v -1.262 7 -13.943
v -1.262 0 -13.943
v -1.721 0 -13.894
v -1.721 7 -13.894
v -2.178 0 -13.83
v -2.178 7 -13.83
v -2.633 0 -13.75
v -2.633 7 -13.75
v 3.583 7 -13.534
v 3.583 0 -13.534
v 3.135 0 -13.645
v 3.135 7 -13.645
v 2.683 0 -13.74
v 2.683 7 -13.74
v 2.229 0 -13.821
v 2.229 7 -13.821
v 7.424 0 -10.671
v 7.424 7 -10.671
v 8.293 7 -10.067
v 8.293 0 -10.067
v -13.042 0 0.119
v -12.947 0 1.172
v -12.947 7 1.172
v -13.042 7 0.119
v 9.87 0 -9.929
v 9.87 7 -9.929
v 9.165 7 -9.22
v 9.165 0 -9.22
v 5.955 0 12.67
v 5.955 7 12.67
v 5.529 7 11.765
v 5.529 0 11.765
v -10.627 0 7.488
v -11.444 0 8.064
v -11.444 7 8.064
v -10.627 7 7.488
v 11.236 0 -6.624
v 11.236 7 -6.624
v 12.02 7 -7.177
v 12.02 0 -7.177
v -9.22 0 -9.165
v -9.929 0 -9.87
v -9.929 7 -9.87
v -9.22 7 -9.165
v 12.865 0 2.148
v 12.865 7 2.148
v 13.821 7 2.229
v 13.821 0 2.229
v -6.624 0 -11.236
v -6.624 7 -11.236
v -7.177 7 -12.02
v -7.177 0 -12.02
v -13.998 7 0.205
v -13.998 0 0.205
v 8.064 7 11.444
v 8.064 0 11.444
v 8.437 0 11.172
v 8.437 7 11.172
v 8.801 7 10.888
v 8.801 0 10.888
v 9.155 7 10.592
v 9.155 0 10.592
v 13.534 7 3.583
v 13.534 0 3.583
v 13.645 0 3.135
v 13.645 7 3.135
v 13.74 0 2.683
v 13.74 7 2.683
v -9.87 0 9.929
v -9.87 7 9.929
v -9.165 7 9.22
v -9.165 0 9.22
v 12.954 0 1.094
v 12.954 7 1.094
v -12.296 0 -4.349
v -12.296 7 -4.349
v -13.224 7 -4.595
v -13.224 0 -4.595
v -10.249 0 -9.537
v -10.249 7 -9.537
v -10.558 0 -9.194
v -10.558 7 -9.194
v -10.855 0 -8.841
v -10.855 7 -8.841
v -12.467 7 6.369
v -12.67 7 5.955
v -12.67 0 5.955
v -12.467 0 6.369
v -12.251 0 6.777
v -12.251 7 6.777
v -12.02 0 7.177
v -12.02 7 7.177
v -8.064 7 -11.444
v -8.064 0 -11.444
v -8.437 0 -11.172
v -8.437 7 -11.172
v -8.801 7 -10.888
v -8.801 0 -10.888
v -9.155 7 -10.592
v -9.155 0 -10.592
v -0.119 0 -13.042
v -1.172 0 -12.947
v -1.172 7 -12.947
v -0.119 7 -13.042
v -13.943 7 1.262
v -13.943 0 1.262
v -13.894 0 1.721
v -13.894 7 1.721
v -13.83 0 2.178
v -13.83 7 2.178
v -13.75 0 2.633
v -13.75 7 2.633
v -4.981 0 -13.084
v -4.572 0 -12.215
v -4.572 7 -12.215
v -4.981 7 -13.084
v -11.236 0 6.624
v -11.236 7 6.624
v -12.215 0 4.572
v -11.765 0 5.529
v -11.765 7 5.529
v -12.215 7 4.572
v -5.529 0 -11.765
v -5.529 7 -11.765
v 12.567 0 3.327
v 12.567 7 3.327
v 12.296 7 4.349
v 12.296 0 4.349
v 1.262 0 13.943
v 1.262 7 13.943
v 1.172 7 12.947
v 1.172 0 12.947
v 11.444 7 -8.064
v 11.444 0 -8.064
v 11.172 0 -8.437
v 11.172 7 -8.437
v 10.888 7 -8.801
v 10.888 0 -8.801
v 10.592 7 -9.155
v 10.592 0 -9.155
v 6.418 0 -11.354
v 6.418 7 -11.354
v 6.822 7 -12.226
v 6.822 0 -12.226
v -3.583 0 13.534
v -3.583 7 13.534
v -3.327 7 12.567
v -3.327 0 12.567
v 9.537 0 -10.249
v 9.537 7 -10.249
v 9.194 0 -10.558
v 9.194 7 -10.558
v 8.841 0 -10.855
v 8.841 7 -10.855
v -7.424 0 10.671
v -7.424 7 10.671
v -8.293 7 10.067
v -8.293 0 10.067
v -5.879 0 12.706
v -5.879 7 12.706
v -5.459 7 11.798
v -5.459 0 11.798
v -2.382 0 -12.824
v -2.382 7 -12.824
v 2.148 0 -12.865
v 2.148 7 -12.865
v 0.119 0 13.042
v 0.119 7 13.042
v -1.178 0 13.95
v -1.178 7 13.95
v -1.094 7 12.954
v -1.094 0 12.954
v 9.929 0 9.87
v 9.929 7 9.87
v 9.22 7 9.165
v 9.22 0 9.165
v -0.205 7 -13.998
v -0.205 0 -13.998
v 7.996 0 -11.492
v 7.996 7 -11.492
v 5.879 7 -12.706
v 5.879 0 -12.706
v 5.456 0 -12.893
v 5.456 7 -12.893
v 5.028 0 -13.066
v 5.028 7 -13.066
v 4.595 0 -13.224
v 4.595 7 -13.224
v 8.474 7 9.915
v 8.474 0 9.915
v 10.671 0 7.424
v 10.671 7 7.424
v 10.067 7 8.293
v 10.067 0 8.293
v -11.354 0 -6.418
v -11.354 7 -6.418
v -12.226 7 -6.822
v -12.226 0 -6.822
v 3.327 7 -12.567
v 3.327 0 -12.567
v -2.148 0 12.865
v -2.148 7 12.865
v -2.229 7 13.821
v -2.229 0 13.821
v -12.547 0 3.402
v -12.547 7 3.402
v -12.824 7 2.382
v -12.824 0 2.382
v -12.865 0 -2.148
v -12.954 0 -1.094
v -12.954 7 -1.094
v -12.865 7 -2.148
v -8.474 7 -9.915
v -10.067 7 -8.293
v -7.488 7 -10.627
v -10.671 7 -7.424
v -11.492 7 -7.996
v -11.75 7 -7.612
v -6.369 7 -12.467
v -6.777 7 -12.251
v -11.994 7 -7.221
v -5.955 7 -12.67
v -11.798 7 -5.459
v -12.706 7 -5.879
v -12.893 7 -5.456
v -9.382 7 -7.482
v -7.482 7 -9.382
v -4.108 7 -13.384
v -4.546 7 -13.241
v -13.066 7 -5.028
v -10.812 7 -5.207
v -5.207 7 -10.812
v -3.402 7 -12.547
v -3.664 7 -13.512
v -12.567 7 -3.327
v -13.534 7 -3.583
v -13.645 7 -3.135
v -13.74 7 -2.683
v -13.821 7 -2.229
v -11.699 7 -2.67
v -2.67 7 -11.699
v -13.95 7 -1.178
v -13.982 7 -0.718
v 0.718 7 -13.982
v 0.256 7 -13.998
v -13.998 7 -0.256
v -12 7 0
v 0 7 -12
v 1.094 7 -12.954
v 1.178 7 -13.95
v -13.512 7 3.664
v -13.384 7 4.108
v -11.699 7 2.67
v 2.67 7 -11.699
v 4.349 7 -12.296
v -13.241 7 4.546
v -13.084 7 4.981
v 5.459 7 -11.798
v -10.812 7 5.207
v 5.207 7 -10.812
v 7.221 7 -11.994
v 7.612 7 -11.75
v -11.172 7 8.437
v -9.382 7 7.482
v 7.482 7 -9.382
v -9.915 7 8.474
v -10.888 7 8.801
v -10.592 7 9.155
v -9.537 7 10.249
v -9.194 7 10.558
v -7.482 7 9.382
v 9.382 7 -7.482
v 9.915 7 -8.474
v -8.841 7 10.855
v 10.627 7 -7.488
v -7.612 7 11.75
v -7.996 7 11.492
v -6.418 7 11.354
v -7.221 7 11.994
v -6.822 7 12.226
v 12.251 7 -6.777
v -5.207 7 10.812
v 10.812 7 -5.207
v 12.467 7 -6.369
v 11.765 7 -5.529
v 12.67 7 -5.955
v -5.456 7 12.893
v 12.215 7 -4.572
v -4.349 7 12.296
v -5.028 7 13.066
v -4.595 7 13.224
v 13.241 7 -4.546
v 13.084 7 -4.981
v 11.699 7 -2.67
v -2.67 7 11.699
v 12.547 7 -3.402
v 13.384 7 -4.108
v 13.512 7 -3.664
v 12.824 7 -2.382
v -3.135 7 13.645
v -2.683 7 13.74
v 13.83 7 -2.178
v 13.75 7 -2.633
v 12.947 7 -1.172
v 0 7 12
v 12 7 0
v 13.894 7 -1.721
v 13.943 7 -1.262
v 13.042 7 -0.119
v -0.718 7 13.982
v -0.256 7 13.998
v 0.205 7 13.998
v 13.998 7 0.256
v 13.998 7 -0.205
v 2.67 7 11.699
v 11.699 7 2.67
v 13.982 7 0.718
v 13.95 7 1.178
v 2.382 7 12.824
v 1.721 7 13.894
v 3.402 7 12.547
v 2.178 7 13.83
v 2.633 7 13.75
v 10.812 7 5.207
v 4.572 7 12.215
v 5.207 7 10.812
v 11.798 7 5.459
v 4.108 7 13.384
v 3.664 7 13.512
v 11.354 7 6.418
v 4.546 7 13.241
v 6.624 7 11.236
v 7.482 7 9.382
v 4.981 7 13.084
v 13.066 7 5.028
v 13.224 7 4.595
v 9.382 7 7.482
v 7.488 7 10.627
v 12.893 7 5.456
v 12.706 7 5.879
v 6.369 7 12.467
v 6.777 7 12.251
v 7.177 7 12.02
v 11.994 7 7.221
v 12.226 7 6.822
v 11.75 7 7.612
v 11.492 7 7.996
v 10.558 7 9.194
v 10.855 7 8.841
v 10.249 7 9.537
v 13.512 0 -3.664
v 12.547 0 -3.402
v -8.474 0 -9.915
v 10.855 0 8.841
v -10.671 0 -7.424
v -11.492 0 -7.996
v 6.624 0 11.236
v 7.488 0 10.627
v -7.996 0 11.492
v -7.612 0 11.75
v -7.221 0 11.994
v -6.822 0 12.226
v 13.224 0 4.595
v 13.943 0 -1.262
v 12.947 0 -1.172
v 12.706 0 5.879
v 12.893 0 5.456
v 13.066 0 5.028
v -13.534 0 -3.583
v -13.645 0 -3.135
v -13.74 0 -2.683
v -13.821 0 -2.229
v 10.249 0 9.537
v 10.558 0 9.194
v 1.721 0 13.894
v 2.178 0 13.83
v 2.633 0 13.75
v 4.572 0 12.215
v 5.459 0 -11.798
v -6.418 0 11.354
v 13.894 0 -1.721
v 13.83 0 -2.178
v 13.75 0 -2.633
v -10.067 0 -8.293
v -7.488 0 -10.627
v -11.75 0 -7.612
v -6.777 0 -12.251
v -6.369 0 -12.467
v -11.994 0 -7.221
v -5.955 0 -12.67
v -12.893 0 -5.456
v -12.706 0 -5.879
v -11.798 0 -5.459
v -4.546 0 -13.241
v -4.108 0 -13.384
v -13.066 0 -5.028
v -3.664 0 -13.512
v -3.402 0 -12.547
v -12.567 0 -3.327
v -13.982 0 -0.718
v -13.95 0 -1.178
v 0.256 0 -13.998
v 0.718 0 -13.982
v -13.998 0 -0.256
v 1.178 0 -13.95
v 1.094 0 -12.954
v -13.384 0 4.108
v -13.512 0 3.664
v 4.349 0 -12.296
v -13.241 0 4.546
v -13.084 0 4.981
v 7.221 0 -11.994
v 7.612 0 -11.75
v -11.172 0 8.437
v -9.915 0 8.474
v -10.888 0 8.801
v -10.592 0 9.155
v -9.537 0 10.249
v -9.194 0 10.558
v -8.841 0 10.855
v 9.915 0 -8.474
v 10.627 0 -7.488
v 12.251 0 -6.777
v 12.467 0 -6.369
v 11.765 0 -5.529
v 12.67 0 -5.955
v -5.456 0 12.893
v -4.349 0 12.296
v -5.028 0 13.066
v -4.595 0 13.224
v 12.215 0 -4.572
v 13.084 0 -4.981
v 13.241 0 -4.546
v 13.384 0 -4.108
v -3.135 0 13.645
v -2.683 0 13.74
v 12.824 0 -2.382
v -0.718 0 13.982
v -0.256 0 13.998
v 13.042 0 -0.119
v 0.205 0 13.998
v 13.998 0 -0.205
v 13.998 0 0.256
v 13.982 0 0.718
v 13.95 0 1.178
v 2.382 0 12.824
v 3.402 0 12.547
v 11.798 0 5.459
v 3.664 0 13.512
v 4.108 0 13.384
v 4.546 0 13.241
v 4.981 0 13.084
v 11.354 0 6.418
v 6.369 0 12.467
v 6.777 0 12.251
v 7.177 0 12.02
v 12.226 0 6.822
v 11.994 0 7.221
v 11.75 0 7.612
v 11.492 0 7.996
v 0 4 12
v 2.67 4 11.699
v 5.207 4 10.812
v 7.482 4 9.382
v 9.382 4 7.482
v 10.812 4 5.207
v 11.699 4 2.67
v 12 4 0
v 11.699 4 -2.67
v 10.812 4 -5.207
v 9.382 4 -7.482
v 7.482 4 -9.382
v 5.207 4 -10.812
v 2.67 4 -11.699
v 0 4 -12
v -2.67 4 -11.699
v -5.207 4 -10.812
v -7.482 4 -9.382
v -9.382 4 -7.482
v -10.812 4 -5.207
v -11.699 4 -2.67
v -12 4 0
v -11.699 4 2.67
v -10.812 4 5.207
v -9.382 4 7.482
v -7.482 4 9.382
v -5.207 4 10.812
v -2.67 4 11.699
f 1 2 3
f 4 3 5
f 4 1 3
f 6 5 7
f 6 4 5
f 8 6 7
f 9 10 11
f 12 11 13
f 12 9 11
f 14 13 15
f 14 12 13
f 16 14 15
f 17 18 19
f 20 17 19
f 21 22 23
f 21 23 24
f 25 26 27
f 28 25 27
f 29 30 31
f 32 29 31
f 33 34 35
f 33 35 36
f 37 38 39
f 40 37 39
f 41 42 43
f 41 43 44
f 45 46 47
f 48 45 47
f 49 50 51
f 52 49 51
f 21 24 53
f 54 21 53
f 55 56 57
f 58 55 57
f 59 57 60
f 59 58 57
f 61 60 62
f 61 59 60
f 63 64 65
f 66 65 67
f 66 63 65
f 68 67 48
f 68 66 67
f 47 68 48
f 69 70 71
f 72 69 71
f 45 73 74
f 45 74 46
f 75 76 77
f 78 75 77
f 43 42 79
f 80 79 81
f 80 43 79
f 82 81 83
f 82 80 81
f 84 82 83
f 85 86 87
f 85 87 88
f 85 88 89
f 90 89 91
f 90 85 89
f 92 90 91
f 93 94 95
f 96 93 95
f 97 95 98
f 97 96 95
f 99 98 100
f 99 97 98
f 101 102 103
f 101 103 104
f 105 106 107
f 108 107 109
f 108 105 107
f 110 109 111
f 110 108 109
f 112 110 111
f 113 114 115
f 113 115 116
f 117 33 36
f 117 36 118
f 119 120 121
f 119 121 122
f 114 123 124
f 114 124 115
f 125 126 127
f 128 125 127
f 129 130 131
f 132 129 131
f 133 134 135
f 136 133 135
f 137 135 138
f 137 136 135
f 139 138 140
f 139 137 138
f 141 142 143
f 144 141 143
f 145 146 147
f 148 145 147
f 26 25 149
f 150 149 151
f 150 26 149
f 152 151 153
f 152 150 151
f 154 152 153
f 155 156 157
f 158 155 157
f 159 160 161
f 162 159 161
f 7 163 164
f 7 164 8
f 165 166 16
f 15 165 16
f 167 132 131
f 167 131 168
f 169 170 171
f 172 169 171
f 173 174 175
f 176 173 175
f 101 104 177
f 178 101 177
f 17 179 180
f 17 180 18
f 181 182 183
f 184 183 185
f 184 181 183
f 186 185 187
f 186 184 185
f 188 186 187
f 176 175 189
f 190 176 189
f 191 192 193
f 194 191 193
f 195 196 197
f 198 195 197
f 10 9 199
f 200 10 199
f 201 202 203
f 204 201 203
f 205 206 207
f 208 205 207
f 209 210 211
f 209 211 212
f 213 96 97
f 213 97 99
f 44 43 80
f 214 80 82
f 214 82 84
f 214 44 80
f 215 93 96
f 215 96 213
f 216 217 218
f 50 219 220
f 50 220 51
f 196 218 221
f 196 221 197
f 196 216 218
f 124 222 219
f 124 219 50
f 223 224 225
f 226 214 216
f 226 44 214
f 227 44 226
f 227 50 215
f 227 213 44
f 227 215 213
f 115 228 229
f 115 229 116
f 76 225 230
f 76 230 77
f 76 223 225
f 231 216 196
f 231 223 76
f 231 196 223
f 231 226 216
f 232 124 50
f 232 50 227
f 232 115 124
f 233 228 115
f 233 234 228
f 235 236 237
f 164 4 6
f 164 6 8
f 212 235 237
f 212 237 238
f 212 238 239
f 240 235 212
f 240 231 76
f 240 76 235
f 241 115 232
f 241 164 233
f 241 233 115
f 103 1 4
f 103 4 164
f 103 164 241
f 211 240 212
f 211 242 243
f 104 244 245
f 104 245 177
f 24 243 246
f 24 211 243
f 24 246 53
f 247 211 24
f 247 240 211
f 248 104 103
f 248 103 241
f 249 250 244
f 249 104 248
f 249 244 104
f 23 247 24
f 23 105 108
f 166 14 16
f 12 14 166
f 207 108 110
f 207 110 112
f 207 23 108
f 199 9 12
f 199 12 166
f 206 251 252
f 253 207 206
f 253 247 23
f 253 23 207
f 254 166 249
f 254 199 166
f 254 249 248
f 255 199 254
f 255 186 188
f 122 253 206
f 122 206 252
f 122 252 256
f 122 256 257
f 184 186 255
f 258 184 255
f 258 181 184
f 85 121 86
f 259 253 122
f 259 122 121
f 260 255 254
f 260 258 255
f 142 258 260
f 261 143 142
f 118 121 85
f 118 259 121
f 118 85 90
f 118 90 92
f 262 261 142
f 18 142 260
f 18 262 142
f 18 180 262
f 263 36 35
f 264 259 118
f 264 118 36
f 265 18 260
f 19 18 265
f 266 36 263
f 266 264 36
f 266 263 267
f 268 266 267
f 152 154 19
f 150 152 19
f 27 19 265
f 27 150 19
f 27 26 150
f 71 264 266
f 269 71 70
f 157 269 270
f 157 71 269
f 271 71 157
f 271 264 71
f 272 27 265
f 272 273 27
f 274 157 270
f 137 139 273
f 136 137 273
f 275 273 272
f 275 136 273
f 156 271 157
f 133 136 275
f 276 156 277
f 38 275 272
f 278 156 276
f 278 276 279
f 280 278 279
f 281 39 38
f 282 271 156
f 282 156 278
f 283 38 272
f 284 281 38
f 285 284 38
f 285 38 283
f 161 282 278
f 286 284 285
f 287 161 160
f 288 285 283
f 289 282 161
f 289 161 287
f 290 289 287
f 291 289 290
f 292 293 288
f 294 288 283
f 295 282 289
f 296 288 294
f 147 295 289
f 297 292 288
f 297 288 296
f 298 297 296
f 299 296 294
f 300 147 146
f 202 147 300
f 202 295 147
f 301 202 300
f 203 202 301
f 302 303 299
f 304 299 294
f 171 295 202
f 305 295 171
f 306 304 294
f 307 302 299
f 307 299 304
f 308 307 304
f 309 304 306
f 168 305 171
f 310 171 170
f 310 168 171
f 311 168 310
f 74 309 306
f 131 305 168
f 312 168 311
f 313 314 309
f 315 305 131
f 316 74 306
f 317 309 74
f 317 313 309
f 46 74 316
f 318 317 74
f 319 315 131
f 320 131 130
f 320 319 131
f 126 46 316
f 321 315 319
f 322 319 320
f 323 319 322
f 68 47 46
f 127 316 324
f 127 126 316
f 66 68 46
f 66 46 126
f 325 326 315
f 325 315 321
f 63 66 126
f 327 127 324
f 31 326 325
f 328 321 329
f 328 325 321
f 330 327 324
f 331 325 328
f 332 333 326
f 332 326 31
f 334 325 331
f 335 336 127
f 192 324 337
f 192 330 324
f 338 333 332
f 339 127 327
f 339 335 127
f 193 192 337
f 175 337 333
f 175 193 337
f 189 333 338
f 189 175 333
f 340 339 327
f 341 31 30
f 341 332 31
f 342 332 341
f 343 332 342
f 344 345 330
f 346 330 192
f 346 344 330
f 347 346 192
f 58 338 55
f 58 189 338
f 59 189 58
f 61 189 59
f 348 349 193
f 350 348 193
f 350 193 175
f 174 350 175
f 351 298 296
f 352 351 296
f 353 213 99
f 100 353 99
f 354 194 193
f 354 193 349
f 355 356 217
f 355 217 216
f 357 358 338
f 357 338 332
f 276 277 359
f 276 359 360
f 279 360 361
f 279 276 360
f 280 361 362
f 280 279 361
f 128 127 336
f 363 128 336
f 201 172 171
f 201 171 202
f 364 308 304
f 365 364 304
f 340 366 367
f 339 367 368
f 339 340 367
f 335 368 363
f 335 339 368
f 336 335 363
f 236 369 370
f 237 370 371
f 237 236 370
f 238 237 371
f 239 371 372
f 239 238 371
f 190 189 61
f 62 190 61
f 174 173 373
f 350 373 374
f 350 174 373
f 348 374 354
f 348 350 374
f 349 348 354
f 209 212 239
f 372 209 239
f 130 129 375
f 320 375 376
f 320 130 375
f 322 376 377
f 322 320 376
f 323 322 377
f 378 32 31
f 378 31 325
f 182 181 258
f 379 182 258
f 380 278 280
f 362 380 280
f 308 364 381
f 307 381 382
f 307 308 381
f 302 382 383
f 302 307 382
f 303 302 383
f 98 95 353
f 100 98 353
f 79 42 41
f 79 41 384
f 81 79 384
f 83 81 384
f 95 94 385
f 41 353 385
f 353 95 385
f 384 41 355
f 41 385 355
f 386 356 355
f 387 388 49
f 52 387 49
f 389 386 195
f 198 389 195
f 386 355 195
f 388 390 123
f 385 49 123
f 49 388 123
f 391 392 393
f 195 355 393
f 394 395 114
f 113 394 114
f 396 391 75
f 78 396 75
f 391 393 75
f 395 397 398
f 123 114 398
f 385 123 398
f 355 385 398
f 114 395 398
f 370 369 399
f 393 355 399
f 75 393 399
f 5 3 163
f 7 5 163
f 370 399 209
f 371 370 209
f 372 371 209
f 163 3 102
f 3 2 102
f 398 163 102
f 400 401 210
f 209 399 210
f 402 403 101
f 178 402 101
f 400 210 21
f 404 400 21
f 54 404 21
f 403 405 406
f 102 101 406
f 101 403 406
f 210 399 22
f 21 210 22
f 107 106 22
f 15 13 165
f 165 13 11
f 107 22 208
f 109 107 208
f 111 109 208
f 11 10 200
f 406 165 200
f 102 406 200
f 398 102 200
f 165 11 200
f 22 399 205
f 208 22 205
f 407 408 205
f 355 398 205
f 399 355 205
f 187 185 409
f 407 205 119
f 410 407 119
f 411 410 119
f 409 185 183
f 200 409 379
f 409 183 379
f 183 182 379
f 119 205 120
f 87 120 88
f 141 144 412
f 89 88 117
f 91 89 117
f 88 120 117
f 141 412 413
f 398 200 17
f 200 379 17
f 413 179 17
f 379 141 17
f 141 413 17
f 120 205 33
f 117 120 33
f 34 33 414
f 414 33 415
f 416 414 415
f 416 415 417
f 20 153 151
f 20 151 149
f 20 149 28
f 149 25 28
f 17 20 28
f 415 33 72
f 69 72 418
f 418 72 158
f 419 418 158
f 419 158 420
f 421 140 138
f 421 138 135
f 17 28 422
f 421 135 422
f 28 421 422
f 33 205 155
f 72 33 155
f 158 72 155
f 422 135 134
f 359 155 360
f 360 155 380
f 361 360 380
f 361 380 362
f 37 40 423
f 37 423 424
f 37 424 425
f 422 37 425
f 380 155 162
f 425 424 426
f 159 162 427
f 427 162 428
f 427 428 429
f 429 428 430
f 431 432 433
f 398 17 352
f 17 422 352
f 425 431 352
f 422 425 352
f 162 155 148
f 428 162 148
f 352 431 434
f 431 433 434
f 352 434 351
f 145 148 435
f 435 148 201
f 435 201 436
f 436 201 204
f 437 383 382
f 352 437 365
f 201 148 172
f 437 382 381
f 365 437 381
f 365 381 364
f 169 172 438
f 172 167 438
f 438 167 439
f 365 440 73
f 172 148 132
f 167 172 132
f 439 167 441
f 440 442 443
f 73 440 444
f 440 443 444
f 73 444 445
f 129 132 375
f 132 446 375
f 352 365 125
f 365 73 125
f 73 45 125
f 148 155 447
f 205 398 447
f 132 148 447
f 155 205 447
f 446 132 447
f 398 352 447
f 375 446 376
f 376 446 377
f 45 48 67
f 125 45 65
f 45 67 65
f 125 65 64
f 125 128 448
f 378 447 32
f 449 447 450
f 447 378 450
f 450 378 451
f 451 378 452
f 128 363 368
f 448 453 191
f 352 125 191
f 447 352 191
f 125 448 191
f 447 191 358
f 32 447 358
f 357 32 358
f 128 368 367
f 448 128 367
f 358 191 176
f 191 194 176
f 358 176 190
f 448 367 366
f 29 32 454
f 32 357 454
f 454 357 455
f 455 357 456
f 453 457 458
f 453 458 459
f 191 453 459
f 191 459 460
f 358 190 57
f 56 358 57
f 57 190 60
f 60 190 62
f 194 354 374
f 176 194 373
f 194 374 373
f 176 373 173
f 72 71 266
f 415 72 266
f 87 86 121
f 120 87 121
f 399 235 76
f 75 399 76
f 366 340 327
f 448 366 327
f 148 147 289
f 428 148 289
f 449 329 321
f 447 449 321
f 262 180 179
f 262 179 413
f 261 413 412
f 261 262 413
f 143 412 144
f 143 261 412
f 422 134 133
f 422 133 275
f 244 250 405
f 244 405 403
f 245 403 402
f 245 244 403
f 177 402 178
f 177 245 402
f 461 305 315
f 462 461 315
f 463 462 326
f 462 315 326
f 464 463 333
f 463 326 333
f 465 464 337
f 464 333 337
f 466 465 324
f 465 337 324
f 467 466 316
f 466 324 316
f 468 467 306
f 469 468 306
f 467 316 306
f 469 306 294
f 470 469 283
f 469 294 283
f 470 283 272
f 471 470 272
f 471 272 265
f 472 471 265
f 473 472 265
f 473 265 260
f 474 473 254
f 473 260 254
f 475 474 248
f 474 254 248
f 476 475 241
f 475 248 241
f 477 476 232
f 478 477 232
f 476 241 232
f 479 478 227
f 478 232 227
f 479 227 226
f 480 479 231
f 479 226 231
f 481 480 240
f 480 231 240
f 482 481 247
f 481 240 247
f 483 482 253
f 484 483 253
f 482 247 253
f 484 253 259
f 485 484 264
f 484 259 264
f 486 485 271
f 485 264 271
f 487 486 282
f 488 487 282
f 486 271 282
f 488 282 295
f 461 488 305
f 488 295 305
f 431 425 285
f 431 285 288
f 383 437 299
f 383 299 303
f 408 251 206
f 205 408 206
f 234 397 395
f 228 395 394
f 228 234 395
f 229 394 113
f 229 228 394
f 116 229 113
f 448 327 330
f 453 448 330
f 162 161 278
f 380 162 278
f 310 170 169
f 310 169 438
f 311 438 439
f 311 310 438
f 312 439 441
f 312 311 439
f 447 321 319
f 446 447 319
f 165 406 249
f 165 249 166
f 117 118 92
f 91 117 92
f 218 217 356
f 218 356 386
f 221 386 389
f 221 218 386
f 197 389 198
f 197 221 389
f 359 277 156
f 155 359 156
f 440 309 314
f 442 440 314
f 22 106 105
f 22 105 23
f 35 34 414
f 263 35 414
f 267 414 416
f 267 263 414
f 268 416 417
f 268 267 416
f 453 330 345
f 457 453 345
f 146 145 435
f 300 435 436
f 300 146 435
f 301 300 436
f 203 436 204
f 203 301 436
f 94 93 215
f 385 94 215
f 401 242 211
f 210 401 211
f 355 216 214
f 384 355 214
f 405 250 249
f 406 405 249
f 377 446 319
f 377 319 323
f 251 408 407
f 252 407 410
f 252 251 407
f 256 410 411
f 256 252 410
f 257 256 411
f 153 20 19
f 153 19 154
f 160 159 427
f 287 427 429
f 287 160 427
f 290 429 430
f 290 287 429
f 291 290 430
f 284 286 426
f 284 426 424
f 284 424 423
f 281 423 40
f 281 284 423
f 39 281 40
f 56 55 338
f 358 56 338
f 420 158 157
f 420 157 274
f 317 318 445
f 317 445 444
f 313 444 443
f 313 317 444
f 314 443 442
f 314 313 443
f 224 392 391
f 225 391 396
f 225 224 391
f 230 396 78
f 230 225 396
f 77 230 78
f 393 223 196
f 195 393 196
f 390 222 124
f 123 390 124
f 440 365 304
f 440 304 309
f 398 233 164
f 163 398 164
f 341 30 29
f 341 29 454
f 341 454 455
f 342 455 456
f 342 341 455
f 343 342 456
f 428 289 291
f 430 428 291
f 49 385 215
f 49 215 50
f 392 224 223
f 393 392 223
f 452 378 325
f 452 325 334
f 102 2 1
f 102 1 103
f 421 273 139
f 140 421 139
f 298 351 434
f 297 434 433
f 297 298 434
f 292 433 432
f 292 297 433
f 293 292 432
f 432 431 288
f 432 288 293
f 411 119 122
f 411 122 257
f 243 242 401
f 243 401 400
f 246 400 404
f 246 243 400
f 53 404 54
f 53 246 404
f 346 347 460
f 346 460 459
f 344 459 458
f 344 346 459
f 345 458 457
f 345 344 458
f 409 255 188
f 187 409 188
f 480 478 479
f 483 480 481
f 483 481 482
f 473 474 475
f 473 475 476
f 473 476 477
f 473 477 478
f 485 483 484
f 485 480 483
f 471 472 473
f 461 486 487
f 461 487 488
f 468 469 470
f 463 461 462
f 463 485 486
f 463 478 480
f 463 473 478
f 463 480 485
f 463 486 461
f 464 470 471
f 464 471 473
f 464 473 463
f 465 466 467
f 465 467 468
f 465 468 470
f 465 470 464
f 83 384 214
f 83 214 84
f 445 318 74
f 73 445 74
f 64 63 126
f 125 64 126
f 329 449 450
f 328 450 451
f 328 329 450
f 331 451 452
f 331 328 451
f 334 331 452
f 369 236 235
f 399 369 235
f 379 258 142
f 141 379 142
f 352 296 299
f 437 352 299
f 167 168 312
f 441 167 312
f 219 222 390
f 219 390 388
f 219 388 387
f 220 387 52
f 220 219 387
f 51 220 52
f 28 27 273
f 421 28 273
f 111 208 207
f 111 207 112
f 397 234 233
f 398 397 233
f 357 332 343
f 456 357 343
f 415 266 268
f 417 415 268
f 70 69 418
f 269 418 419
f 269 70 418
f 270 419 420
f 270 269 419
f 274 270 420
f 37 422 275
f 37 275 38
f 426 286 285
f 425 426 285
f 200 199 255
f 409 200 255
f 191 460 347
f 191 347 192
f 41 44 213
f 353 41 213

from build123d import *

# Parameters (mm, degrees)
SKETCH_1_R          = 13
EXTRUDE_1_DEPTH     = 7
SKETCH_6_R          = 14
EXTRUDE_4_DEPTH     = 7
SKETCH_2_R          = 12
CUT_EXTRUDE_1_DEPTH = 3
CUT_EXTRUDE_2_DEPTH = 22


with BuildPart() as part:
    # 草图1 → 凸台-拉伸1 (new body)
    with BuildSketch(Plane(origin=(0, 0, 0), x_dir=(1, 0, 0), z_dir=(0, 1, 0))):
        with Locations(Location((0, 0, 0), (0, 0, 270))):
            Circle(SKETCH_1_R)
    extrude(amount=EXTRUDE_1_DEPTH)

    # 草图6 → 凸台-拉伸4 (add, through all)
    with BuildSketch(Plane(origin=(0, 7, 0), x_dir=(1, 0, 0), z_dir=(0, 1, 0))):
        with Locations(Location((0, 0, 0), (0, 0, 270))):
            Circle(SKETCH_6_R)
    extrude(amount=-EXTRUDE_4_DEPTH)

    # 草图2 → 切除-拉伸1 (cut)
    with BuildSketch(Plane(origin=(0, 7, 0), x_dir=(1, 0, 0), z_dir=(0, 1, 0))):
        with Locations(Location((0, 0, 0), (0, 0, 270))):
            Circle(SKETCH_2_R)
    extrude(amount=-CUT_EXTRUDE_1_DEPTH, mode=Mode.SUBTRACT)

    # 草图7 → 切除-拉伸2 (cut, through all)
    with BuildSketch(Plane(origin=(0, 7, 0), x_dir=(1, 0, 0), z_dir=(0, 1, 0))):
        Polygon((-15.646830527, 4.142221687), (-12.567085782, 3.326913727), (-12.296421758, 4.349320163), (-15.376166503, 5.164628122), align=None)
        Polygon((-14.689830765, 6.79633564), (-11.798451005, 5.458621977), (-11.354359961, 6.418495447), (-14.245739722, 7.756209109), align=None)
        Polygon((-13.28648793, 9.243946373), (-10.671326264, 7.42447276), (-10.067301683, 8.292647994), (-12.682463348, 10.112121607), align=None)
        Polygon((-11.479441881, 11.410684473), (-9.219958675, 9.164734695), (-8.474353537, 9.914832629), (-10.733836743, 12.160782407), align=None)
        Polygon((-9.3235988, 13.230714699), (-7.488447307, 10.626530804), (-6.623916447, 11.235760092), (-8.45906794, 13.839943987), align=None)
        Polygon((-6.884462888, 14.648736355), (-5.529403257, 11.765445152), (-4.572215008, 12.215294669), (-5.927274639, 15.098585872), align=None)
        Polygon((-4.236146054, 15.621663569), (-3.402351087, 12.546872402), (-2.381589129, 12.8236737), (-3.215384096, 15.898464866), align=None)
        Polygon((-1.459116066, 16.11993444), (-1.171920201, 12.947069284), (-0.11859987, 13.042411894), (-0.405795735, 16.21527705), align=None)
        Polygon((1.362248425, 16.12840926), (1.094118888, 12.953876017), (2.147992986, 12.864863002), (2.416122524, 16.039396246), align=None)
        Polygon((4.142221687, 15.646830527), (3.326913727, 12.567085782), (4.349320163, 12.296421758), (5.164628122, 15.376166503), align=None)
        Polygon((6.79633564, 14.689830765), (5.458621977, 11.798451005), (6.418495447, 11.354359961), (7.756209109, 14.245739722), align=None)
        Polygon((9.243946373, 13.28648793), (7.42447276, 10.671326264), (8.292647994, 10.067301683), (10.112121607, 12.682463348), align=None)
        Polygon((11.410684473, 11.479441881), (9.164734695, 9.219958675), (9.914832629, 8.474353537), (12.160782407, 10.733836743), align=None)
        Polygon((13.230714699, 9.3235988), (10.626530804, 7.488447307), (11.235760092, 6.623916447), (13.839943987, 8.45906794), align=None)
        Polygon((14.648736355, 6.884462888), (11.765445152, 5.529403257), (12.215294669, 4.572215008), (15.098585872, 5.927274639), align=None)
        Polygon((15.621663569, 4.236146054), (12.546872402, 3.402351087), (12.8236737, 2.381589129), (15.898464866, 3.215384096), align=None)
        Polygon((16.11993444, 1.459116066), (12.947069284, 1.171920201), (13.042411894, 0.11859987), (16.21527705, 0.405795735), align=None)
        Polygon((16.12840926, -1.362248425), (12.953876017, -1.094118888), (12.864863002, -2.147992986), (16.039396246, -2.416122524), align=None)
        Polygon((15.646830527, -4.142221687), (12.567085782, -3.326913727), (12.296421758, -4.349320163), (15.376166503, -5.164628122), align=None)
        Polygon((14.689830765, -6.79633564), (11.798451005, -5.458621977), (11.354359961, -6.418495447), (14.245739722, -7.756209109), align=None)
        Polygon((13.28648793, -9.243946373), (10.671326264, -7.42447276), (10.067301683, -8.292647994), (12.682463348, -10.112121607), align=None)
        Polygon((11.479441881, -11.410684473), (9.219958675, -9.164734695), (8.474353537, -9.914832629), (10.733836743, -12.160782407), align=None)
        Polygon((9.3235988, -13.230714699), (7.488447307, -10.626530804), (6.623916447, -11.235760092), (8.45906794, -13.839943987), align=None)
        Polygon((6.884462888, -14.648736355), (5.529403257, -11.765445152), (4.572215008, -12.215294669), (5.927274639, -15.098585872), align=None)
        Polygon((4.236146054, -15.621663569), (3.402351087, -12.546872402), (2.381589129, -12.8236737), (3.215384096, -15.898464866), align=None)
        Polygon((1.459116066, -16.11993444), (1.171920201, -12.947069284), (0.11859987, -13.042411894), (0.405795735, -16.21527705), align=None)
        Polygon((-1.362248425, -16.12840926), (-1.094118888, -12.953876017), (-2.147992986, -12.864863002), (-2.416122524, -16.039396246), align=None)
        Polygon((-4.142221687, -15.646830527), (-3.326913727, -12.567085782), (-4.349320163, -12.296421758), (-5.164628122, -15.376166503), align=None)
        Polygon((-6.79633564, -14.689830765), (-5.458621977, -11.798451005), (-6.418495447, -11.354359961), (-7.756209109, -14.245739722), align=None)
        Polygon((-9.243946373, -13.28648793), (-7.42447276, -10.671326264), (-8.292647994, -10.067301683), (-10.112121607, -12.682463348), align=None)
        Polygon((-11.410684473, -11.479441881), (-9.164734695, -9.219958675), (-9.914832629, -8.474353537), (-12.160782407, -10.733836743), align=None)
        Polygon((-13.230714699, -9.3235988), (-10.626530804, -7.488447307), (-11.235760092, -6.623916447), (-13.839943987, -8.45906794), align=None)
        Polygon((-14.648736355, -6.884462888), (-11.765445152, -5.529403257), (-12.215294669, -4.572215008), (-15.098585872, -5.927274639), align=None)
        Polygon((-15.621663569, -4.236146054), (-12.546872402, -3.402351087), (-12.8236737, -2.381589129), (-15.898464866, -3.215384096), align=None)
        Polygon((-16.11993444, -1.459116066), (-12.947069284, -1.171920201), (-13.042411894, -0.11859987), (-16.21527705, -0.405795735), align=None)
        Polygon((-16.12840926, 1.362248425), (-12.953876017, 1.094118888), (-12.864863002, 2.147992986), (-16.039396246, 2.416122524), align=None)
    extrude(amount=-CUT_EXTRUDE_2_DEPTH, mode=Mode.SUBTRACT)


solid = part.part
